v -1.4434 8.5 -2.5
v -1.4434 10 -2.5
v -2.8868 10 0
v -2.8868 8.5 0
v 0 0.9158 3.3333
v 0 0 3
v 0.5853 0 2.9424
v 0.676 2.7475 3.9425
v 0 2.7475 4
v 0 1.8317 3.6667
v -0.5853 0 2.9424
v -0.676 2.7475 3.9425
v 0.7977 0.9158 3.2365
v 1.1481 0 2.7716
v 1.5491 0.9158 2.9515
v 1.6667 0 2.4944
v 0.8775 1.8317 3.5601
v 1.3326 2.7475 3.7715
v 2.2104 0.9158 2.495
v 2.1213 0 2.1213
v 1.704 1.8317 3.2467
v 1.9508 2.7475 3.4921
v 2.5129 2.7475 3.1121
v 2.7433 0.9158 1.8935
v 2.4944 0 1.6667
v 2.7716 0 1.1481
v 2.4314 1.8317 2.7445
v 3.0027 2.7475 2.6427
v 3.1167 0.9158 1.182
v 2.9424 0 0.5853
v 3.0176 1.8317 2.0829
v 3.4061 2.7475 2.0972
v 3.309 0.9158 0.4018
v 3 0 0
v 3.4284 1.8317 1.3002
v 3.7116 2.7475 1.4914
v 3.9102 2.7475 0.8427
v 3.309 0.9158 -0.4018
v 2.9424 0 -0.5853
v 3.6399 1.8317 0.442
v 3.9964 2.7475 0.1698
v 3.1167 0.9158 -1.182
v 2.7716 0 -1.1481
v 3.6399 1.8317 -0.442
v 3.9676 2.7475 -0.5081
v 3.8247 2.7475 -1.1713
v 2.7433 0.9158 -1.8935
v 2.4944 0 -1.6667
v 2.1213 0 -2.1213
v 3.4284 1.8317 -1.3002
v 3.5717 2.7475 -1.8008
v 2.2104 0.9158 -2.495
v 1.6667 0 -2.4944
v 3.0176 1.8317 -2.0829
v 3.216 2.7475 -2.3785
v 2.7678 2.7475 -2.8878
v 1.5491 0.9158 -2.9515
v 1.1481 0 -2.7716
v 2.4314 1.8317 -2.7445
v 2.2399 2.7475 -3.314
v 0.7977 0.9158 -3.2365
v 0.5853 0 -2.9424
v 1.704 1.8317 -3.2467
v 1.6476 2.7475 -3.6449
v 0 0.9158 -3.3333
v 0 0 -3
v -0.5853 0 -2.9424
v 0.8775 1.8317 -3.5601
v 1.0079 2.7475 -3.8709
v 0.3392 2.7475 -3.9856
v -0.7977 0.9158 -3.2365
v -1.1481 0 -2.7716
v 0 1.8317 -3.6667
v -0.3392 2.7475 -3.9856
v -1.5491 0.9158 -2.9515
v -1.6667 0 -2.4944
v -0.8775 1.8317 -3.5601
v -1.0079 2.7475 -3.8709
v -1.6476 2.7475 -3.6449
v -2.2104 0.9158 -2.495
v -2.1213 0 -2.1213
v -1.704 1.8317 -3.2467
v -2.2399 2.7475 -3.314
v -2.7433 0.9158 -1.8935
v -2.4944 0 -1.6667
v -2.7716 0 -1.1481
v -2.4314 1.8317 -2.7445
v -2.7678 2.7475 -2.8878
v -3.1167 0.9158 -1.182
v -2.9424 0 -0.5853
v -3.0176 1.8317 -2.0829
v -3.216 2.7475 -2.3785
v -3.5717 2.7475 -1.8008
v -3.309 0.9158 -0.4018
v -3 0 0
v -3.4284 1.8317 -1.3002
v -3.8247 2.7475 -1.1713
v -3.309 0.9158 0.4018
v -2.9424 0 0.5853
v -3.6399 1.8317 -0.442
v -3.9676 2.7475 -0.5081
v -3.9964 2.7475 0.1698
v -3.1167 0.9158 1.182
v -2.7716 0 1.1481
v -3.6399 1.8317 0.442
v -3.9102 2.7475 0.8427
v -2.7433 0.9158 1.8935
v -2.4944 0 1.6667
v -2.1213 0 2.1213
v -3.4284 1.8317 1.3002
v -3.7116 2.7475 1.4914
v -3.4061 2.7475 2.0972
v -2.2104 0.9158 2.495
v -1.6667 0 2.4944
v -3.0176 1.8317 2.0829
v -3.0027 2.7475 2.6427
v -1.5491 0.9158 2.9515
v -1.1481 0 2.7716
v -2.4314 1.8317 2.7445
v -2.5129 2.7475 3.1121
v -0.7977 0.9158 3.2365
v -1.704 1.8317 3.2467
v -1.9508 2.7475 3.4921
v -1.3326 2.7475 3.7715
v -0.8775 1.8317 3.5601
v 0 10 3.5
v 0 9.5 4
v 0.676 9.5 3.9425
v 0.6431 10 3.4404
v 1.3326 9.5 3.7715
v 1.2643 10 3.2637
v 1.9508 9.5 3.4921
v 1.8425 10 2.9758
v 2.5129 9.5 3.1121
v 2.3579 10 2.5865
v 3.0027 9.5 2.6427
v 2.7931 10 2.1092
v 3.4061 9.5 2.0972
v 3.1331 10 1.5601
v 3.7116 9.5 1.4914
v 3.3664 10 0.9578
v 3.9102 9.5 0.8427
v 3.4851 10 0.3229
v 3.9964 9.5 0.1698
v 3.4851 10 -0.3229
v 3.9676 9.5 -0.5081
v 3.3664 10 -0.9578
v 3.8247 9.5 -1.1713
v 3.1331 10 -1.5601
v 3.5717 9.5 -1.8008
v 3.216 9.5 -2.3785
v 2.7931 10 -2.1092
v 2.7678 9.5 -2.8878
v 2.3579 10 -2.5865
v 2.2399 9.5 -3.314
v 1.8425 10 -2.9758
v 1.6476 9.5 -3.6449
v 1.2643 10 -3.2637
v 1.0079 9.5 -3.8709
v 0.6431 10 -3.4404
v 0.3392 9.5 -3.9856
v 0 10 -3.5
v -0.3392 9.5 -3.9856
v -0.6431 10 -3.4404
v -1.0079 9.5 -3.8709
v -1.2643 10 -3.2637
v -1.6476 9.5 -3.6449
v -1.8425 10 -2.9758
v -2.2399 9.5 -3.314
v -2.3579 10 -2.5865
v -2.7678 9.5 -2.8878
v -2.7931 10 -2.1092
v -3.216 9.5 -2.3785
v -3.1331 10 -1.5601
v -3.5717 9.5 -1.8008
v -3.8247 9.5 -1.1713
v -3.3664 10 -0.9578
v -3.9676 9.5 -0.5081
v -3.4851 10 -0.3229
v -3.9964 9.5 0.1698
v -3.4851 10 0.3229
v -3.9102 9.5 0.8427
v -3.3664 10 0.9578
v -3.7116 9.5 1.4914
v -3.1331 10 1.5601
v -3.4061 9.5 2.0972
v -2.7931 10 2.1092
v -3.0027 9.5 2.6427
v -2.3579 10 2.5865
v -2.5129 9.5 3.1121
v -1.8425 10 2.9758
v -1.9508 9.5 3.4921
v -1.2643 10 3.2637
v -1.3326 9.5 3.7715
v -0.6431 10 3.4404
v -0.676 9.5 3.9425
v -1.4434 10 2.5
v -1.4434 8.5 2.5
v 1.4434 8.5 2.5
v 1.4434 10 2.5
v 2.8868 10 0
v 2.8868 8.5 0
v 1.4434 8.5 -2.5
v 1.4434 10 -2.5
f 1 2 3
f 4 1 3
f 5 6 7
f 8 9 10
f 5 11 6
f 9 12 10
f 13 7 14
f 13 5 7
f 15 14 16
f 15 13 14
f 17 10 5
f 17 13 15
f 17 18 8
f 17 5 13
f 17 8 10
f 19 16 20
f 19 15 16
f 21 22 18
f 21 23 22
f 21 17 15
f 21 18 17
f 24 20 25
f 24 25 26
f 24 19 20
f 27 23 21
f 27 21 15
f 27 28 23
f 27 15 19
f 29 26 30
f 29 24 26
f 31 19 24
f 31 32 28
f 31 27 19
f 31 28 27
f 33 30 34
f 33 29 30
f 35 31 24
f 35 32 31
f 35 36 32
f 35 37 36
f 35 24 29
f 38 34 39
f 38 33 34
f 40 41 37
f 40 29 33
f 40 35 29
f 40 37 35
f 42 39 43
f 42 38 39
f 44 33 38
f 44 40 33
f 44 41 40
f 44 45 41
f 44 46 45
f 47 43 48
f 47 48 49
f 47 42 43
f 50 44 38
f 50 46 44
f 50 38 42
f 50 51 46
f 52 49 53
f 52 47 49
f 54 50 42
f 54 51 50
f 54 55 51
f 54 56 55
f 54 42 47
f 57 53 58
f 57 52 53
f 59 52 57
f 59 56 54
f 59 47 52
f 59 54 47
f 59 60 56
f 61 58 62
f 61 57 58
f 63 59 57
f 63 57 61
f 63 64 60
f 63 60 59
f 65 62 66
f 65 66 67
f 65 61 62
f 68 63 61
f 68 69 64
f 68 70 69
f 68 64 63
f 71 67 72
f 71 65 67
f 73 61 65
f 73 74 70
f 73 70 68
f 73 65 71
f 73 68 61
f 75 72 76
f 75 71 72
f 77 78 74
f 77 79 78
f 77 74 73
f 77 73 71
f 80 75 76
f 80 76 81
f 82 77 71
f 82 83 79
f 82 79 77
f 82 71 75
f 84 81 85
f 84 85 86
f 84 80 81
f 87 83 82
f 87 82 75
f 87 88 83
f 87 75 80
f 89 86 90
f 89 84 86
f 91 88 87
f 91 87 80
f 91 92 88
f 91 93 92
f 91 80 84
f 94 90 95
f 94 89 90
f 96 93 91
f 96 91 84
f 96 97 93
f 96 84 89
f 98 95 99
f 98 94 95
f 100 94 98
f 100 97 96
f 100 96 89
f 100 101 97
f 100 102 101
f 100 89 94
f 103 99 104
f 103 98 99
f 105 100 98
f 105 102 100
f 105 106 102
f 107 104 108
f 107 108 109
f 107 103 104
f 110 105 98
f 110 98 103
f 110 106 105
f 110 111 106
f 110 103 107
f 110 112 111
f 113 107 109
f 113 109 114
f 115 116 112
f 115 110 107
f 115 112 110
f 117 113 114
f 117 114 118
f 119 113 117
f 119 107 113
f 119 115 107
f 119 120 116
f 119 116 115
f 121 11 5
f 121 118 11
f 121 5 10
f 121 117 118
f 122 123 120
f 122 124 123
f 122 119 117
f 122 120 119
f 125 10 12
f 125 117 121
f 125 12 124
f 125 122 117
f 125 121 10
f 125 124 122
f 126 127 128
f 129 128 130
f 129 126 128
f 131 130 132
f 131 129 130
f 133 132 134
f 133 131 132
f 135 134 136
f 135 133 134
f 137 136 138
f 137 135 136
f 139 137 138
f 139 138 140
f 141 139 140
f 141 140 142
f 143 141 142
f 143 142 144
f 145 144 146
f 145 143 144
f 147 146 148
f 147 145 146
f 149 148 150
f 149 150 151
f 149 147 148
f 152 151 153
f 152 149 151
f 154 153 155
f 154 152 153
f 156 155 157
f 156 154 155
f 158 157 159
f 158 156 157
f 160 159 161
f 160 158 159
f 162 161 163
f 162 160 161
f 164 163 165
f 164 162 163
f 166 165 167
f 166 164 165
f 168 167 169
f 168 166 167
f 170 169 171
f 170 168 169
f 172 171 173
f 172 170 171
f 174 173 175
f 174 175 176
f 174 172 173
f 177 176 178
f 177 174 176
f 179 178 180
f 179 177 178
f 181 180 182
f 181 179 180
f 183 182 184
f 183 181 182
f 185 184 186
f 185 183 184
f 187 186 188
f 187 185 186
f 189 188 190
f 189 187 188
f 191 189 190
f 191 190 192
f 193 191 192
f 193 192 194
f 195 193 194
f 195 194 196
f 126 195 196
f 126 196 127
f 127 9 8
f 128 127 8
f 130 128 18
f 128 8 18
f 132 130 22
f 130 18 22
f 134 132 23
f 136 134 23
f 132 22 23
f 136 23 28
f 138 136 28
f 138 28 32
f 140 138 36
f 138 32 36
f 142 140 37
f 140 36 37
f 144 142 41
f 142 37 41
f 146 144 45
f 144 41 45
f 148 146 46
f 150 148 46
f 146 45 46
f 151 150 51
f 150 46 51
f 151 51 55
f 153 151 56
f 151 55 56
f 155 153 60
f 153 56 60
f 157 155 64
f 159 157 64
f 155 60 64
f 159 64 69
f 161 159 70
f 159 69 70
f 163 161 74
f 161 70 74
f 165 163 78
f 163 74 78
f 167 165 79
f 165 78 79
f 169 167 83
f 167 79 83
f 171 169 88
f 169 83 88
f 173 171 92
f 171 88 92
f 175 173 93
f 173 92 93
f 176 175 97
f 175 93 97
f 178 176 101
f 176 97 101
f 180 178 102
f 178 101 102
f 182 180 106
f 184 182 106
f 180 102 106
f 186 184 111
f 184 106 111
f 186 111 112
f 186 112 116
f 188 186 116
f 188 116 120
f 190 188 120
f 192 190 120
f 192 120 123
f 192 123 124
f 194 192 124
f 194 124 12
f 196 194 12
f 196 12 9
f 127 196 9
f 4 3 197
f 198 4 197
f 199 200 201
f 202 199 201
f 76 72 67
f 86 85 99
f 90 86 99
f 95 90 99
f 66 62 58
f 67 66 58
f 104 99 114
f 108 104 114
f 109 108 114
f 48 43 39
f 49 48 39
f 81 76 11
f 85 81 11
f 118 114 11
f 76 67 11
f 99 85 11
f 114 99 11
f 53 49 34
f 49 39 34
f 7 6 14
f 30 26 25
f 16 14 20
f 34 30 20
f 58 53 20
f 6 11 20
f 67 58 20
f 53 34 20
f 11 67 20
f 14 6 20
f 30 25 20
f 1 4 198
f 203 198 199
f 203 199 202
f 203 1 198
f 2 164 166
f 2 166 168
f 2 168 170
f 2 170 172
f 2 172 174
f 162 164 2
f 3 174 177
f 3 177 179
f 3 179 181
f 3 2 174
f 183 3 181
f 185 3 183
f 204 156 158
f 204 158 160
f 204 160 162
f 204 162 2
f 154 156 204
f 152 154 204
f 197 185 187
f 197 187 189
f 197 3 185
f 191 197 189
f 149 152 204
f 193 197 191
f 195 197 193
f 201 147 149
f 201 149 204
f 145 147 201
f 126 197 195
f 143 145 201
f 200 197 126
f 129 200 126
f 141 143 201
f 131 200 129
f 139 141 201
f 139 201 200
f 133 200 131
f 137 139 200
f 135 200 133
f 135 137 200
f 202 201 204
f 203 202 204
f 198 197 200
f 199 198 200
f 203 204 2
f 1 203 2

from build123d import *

# Parameters (mm, degrees)
SKETCH2_R           = 4
BOSS_EXTRUDE1_DEPTH = 10
CUT_EXTRUDE1_DEPTH  = 1.5
CHAMFER1_SIZE       = 0.5
CHAMFER2_SIZE       = 1
CHAMFER2_SIZE2      = 2.747477419


with BuildPart() as part:
    # Sketch2 → Boss-Extrude1 (new body)
    with BuildSketch(Plane(origin=(0, 0, 0), x_dir=(1, 0, 0), z_dir=(0, 1, 0))):
        with Locations(Location((0, 0, 0), (0, 0, 270))):
            Circle(SKETCH2_R)
    extrude(amount=BOSS_EXTRUDE1_DEPTH)

    # Sketch3 → Cut-Extrude1 (cut)
    with BuildSketch(Plane(origin=(0, 10, 0), x_dir=(1, 0, 0), z_dir=(0, 1, 0))):
        Polygon((2.886751346, 0), (1.443375673, 2.5), (-1.443375673, 2.5), (-2.886751346, 0), (-1.443375673, -2.5), (1.443375673, -2.5), align=None)
    extrude(amount=-CUT_EXTRUDE1_DEPTH, mode=Mode.SUBTRACT)

    # Chamfer1
    chamfer1_edges = [part.edges().sort_by_distance(p)[0] for p in [
        (0, 10, -4),
    ]]
    chamfer(chamfer1_edges, length=CHAMFER1_SIZE)

    # Chamfer2
    chamfer2_edges = [part.edges().sort_by_distance(p)[0] for p in [
        (0, 0, -4),
    ]]
    chamfer2_side = [part.faces().sort_by_distance(p)[0] for p in [
        (0, 0, 0),
    ]]
    chamfer(chamfer2_edges, length=CHAMFER2_SIZE, length2=CHAMFER2_SIZE2, reference=chamfer2_side[0])


solid = part.part
